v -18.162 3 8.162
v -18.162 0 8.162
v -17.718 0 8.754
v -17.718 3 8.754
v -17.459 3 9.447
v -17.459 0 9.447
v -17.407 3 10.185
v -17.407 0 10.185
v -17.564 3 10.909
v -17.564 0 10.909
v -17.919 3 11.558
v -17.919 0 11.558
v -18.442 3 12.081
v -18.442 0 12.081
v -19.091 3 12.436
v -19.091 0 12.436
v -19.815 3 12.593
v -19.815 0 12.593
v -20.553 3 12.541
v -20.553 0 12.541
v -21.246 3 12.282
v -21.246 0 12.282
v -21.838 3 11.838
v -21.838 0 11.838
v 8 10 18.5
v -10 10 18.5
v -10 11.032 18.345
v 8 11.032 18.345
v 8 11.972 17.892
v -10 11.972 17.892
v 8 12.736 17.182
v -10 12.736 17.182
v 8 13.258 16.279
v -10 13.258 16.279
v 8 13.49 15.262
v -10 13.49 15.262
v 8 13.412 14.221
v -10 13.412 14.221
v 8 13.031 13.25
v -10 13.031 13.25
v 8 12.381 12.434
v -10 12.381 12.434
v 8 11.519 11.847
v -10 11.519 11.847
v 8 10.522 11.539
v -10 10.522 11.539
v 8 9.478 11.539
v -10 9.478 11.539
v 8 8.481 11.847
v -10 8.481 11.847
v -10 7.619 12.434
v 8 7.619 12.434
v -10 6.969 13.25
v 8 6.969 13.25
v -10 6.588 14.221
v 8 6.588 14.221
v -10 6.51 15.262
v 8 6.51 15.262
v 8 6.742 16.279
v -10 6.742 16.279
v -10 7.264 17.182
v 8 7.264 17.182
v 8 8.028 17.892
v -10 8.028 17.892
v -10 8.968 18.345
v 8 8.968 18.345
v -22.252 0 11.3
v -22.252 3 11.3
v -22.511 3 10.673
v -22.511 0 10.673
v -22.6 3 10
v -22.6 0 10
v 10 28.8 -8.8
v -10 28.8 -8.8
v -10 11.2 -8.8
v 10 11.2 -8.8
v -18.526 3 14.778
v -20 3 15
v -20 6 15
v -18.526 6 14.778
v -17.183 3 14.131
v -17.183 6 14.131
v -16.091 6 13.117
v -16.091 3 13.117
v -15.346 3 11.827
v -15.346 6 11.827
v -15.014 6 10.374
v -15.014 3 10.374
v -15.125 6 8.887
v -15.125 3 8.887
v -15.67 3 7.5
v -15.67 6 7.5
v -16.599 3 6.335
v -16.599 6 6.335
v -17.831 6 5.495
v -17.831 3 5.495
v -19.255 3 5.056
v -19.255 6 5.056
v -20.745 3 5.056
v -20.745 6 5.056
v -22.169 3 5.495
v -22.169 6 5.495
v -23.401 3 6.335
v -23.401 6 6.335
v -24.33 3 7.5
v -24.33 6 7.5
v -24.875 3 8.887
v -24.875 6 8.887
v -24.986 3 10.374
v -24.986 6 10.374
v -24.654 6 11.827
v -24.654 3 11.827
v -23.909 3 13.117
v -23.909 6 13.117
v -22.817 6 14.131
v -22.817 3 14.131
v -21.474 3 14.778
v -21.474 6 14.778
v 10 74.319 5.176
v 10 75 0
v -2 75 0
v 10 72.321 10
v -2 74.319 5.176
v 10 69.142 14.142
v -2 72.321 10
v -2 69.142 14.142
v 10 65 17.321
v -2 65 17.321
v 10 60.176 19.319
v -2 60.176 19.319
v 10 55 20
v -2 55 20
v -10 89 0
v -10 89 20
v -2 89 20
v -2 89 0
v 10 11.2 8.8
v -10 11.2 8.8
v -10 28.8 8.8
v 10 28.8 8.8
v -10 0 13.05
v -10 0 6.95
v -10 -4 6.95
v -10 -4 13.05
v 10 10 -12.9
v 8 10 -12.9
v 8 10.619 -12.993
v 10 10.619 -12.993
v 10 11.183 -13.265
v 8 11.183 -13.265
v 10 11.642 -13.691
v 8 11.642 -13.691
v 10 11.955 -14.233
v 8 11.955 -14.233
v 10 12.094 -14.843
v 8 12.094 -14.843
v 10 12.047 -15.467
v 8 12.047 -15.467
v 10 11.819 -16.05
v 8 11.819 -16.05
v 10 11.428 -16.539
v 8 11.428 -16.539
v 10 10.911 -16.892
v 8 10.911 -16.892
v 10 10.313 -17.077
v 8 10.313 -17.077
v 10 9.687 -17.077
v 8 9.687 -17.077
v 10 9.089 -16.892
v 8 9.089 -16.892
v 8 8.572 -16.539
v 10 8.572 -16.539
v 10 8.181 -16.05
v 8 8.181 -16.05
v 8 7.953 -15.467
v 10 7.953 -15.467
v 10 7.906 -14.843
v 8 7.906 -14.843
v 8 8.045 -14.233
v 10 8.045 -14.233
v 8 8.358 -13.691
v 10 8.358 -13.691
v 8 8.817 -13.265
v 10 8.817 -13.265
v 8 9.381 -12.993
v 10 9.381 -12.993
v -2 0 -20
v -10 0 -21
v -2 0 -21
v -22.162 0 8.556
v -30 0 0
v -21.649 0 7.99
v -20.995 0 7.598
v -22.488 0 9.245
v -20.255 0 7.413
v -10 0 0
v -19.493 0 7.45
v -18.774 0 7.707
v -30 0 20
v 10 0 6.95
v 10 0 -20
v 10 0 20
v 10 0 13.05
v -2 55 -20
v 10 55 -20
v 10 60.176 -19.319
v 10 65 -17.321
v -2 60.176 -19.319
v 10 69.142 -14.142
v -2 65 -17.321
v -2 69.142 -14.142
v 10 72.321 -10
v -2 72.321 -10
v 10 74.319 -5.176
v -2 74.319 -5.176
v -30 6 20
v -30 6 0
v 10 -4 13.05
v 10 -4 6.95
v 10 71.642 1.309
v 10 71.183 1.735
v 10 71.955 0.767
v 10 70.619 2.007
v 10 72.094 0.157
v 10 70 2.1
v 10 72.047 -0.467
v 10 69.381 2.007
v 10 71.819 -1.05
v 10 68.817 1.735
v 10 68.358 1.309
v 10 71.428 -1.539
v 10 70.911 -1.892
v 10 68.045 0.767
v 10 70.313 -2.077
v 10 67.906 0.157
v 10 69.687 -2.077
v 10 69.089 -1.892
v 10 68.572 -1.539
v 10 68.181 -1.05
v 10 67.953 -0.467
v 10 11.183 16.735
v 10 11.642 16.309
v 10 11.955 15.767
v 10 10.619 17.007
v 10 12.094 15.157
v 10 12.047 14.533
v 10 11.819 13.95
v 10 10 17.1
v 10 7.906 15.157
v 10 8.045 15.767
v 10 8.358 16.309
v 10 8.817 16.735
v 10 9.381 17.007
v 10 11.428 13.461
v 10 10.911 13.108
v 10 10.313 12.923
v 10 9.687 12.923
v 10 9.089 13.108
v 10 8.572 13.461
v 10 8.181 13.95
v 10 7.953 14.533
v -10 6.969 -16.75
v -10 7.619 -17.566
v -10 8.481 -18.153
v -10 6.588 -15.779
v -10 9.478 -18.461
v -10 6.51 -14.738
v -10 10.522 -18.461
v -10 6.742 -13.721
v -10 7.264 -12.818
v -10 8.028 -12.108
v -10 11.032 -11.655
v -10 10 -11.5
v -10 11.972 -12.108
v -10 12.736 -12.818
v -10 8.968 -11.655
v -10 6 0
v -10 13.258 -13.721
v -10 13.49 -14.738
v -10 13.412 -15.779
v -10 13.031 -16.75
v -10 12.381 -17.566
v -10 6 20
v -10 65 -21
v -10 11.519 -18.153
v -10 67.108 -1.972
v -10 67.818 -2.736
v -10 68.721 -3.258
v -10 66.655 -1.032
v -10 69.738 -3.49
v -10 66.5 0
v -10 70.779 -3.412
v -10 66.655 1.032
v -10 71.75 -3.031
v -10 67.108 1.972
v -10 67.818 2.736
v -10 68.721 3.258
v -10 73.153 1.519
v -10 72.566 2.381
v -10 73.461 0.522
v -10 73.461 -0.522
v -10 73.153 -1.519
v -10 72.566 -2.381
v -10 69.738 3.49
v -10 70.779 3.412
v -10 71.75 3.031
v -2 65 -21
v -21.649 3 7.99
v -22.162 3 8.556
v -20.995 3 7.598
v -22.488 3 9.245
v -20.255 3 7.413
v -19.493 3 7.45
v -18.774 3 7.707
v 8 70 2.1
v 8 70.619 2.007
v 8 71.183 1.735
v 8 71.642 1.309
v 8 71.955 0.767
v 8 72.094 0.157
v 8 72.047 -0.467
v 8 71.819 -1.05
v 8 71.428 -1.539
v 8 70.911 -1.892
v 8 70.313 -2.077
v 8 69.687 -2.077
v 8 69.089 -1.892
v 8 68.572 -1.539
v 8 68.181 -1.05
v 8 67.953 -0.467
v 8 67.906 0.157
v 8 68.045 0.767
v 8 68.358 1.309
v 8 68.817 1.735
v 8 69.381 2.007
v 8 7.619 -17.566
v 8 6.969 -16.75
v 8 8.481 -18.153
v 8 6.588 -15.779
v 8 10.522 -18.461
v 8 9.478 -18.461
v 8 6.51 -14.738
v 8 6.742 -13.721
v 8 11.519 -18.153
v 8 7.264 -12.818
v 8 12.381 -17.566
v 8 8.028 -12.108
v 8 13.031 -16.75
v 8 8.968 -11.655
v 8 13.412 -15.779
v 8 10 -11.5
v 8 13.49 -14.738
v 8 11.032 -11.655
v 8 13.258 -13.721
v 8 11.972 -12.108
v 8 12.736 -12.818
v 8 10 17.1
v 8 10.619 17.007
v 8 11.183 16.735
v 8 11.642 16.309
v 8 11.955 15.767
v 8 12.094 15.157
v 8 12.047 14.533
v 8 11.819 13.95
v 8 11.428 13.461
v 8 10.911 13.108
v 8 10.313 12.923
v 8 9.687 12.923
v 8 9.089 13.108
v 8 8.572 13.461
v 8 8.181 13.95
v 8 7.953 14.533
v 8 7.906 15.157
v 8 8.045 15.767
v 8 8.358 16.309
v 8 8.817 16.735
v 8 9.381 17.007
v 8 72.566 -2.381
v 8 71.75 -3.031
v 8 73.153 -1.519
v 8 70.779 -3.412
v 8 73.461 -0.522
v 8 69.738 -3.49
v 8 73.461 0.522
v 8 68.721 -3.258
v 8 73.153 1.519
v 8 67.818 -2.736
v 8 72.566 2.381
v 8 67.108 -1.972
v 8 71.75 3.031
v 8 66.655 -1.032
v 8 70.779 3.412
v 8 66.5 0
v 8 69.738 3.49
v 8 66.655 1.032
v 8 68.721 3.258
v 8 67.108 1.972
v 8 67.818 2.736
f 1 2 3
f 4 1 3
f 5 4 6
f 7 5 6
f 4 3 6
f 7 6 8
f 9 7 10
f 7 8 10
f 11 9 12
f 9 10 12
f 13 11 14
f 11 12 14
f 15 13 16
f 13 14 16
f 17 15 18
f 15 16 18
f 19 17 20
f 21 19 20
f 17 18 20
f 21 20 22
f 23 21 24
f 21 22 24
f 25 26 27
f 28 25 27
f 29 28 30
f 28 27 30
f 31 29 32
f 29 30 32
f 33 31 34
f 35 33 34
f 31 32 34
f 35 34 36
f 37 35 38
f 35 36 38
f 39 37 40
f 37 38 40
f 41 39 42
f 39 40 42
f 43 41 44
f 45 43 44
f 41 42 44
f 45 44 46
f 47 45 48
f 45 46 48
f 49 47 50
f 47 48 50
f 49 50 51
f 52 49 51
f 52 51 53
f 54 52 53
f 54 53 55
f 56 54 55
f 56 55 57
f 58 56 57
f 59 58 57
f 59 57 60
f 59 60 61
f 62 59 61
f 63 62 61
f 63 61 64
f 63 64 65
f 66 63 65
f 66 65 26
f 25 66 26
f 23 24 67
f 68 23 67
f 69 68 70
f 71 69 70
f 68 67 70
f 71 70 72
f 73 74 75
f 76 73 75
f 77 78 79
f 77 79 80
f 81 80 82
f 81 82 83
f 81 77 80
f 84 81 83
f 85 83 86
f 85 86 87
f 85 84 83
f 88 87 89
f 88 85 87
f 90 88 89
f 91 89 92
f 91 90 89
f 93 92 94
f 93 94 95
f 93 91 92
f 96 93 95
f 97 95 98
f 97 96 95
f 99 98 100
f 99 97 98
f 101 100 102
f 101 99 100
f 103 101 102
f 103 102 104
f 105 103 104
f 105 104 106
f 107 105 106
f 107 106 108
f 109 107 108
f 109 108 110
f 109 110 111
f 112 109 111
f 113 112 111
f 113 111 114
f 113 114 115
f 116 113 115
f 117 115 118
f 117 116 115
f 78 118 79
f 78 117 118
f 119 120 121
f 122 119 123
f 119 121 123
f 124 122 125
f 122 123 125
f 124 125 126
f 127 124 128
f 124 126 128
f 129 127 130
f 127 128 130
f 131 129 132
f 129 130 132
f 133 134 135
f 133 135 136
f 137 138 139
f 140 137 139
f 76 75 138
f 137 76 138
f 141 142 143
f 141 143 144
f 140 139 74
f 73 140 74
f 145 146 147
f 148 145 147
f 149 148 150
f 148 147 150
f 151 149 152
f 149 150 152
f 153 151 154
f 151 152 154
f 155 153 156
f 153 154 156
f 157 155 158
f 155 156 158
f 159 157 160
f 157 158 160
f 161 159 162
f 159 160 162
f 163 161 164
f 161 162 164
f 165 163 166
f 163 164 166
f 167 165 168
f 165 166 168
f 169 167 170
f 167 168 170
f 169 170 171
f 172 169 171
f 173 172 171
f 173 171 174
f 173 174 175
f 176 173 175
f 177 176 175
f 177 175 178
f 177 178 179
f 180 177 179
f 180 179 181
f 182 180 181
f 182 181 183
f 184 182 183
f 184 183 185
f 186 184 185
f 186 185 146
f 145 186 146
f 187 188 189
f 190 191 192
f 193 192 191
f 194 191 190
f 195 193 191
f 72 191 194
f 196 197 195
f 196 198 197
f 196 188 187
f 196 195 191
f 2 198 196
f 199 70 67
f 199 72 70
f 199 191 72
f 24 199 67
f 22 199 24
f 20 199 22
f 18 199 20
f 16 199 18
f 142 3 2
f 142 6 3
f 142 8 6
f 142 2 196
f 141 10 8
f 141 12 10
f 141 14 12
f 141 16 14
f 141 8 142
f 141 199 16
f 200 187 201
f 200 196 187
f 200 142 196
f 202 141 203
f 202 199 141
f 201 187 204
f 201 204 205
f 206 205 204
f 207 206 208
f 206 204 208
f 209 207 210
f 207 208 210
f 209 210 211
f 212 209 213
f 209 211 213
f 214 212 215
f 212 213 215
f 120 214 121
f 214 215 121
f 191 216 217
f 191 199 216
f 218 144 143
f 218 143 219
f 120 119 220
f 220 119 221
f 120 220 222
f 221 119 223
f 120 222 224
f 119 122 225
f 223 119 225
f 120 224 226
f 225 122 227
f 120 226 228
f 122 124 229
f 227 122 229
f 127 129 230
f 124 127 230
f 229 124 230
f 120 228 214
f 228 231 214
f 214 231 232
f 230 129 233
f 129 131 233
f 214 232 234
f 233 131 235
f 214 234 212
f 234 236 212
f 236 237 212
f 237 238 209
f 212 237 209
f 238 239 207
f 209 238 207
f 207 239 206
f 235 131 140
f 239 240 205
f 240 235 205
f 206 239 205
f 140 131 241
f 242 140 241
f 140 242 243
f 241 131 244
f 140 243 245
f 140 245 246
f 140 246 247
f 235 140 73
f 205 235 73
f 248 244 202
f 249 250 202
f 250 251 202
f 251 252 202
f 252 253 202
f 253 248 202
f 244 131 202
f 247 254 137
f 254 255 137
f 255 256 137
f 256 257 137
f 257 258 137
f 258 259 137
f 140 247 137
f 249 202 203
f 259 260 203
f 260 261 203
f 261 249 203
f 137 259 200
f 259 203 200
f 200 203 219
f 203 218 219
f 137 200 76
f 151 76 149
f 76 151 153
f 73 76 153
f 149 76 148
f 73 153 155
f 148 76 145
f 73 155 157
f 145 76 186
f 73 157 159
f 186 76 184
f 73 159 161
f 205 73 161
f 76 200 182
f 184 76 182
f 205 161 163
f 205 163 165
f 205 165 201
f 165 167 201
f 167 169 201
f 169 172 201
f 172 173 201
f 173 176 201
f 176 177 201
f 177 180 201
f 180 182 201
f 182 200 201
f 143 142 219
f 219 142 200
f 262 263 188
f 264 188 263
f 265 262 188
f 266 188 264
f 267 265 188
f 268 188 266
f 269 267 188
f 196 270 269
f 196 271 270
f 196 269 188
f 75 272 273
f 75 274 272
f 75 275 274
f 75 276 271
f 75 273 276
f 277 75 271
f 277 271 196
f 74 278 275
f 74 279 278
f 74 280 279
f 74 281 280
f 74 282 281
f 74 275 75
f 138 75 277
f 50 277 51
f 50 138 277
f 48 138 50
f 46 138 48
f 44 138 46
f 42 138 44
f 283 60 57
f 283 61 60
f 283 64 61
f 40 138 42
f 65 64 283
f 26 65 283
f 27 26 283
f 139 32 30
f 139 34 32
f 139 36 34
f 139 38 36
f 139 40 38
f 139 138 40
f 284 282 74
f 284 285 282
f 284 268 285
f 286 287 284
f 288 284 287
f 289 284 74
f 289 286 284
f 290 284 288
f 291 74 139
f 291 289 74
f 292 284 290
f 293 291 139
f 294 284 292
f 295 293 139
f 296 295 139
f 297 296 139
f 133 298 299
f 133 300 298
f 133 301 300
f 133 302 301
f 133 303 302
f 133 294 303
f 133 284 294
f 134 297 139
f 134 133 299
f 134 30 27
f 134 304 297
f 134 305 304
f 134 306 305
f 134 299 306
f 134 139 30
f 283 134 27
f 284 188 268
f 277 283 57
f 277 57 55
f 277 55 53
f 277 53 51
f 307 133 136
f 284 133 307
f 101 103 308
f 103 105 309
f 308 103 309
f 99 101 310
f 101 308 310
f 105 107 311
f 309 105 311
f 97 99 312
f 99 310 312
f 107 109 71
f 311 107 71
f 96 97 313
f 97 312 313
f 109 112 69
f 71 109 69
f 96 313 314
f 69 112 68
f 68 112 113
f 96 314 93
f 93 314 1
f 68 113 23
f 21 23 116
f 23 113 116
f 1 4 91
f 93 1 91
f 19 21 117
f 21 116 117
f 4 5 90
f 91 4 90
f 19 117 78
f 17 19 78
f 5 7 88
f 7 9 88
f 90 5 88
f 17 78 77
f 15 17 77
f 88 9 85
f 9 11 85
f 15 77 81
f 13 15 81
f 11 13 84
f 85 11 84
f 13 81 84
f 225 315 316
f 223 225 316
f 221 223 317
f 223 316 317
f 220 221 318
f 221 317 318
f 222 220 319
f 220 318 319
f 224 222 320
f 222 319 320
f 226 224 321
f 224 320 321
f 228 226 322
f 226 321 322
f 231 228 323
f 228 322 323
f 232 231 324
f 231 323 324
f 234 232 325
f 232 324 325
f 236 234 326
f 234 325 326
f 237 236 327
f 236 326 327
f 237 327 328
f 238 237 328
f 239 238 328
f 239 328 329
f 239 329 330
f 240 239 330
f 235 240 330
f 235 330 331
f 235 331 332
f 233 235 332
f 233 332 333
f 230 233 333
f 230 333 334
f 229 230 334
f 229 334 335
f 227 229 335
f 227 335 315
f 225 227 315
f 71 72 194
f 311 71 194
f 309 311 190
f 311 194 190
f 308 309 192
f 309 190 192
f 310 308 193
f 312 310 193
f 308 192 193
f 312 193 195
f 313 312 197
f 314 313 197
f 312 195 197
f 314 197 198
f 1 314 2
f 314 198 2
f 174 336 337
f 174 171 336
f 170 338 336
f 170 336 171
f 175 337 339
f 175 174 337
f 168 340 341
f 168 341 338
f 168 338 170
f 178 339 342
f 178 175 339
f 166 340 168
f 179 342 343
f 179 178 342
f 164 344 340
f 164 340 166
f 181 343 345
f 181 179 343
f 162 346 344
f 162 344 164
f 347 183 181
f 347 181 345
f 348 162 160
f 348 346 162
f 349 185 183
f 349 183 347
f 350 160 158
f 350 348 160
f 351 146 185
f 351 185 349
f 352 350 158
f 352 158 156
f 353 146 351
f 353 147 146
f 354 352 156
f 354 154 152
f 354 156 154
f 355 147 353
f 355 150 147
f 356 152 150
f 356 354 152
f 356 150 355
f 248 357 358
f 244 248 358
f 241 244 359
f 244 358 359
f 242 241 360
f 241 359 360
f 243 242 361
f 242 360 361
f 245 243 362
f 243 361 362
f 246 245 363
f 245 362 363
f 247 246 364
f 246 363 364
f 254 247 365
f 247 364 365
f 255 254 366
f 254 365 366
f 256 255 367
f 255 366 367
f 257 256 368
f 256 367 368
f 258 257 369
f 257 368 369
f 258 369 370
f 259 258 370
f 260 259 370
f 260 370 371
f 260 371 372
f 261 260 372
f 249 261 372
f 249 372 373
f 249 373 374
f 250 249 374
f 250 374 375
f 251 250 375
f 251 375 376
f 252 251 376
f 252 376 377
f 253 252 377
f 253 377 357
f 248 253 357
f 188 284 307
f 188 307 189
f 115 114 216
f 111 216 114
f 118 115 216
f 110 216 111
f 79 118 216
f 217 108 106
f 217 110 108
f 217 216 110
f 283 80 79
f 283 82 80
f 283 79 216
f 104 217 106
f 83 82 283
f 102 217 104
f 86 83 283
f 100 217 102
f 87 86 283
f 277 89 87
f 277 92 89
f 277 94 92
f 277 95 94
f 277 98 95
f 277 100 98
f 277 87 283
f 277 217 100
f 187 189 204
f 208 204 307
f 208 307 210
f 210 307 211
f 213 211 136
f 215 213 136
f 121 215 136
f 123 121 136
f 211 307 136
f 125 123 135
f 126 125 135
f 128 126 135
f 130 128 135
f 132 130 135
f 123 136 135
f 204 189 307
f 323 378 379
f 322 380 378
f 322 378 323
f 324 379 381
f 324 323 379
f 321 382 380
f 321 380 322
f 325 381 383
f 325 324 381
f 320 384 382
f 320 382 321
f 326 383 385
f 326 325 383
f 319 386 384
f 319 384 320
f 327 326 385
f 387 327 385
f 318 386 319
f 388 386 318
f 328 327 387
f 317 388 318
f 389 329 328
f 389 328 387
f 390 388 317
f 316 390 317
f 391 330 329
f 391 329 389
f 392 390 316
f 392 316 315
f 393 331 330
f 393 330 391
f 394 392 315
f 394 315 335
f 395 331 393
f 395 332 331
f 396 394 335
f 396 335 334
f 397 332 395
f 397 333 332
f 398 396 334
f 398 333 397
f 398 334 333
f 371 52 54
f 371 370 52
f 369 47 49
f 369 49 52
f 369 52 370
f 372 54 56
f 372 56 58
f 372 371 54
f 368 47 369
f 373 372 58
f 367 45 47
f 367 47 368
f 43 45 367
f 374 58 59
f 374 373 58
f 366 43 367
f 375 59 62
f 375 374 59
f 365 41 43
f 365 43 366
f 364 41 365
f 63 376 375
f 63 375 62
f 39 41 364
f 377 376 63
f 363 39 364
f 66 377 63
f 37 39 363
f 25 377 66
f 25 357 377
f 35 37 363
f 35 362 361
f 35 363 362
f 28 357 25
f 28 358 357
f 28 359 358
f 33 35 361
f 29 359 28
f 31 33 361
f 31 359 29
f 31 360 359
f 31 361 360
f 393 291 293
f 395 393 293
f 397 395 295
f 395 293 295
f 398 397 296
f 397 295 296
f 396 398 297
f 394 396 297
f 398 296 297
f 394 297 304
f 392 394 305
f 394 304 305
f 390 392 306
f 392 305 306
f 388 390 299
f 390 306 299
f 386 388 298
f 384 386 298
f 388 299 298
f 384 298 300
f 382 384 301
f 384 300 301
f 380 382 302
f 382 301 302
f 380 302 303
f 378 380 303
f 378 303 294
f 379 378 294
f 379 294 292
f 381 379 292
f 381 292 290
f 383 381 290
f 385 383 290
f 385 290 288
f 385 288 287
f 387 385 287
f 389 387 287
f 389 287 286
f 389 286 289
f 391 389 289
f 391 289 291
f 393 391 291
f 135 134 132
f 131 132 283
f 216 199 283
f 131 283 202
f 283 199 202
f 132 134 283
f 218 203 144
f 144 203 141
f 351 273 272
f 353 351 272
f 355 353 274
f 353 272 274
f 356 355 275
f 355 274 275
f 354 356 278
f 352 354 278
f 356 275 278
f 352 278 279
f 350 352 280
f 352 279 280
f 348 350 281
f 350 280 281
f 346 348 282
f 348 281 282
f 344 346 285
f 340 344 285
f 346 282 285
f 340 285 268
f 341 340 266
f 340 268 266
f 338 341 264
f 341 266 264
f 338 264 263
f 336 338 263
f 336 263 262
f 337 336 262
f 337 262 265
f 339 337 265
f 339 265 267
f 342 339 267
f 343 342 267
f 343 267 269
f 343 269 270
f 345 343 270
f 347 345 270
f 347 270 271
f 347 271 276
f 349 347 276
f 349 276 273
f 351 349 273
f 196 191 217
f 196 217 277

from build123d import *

# Parameters (mm, degrees)
SKETCH_1_W           = 20
SKETCH_1_H           = 60
SKETCH_1_R           = 2.6
EXTRUDE_1_DEPTH      = 6
SKETCH_2_W           = 6.1
SKETCH_2_H           = 43.9
SKETCH_2_H_2         = 1.95
SKETCH_2_W_2         = 6.043917029
EXTRUDE_2_DEPTH      = 4
SKETCH_3_R           = 4.9
CUT_EXTRUDE_3_DEPTH  = 3
SKETCH_4_W           = 20
SKETCH_4_H           = 40
EXTRUDE_3_DEPTH      = 69
CUT_EXTRUDE_4_DEPTH  = 75
SKETCH_6_R           = 2.1
CUT_EXTRUDE_5_DEPTH  = 75
CUT_EXTRUDE_6_DEPTH  = 75
SKETCH_13_R          = 3.5
CUT_EXTRUDE_8_DEPTH  = 3
SKETCH_14_R          = 3.5
CUT_EXTRUDE_9_DEPTH  = 3
SKETCH_15_W          = 6.1
SKETCH_15_H          = 1.95
SKETCH_15_W_2        = 6.043917029
CUT_EXTRUDE_10_DEPTH = 4
SKETCH_24_R          = 3.5
CUT_EXTRUDE_14_DEPTH = 15
SKETCH_25_R          = 3.5
CUT_EXTRUDE_15_DEPTH = 15
SKETCH_26_W          = 6.1
SKETCH_26_H          = 43.9
CUT_EXTRUDE_16_DEPTH = 4
SKETCH_27_W          = 20
SKETCH_27_H          = 10
CUT_EXTRUDE_17_DEPTH = 10
EXTRUDE_4_DEPTH      = 4
SKETCH_29_R          = 3.5
CUT_EXTRUDE_18_DEPTH = 18
EXTRUDE_5_DEPTH      = 8
SKETCH_31_W          = 20
SKETCH_31_H          = 20
EXTRUDE_6_DEPTH      = 3
CUT_EXTRUDE_19_DEPTH = 6
SKETCH_33_W          = 20
SKETCH_33_H          = 20
SKETCH_33_R          = 5
EXTRUDE_7_DEPTH      = 3


with BuildPart() as part:
    # 草图1 → 凸台-拉伸1 (new body)
    with BuildSketch(Plane(origin=(0, 0, 0), x_dir=(1, 0, 0), z_dir=(0, 1, 0))):
        Rectangle(SKETCH_1_W, SKETCH_1_H)
        with Locations(Location((0, 25, 0), (0, 0, 270))):
            Circle(SKETCH_1_R, mode=Mode.SUBTRACT)
        with Locations(Location((0, -25, 0), (0, 0, 270))):
            Circle(SKETCH_1_R, mode=Mode.SUBTRACT)
    extrude(amount=EXTRUDE_1_DEPTH)

    # 草图2 → 凸台-拉伸2 (add)
    with BuildSketch(Plane.XZ):
        Rectangle(SKETCH_2_W, SKETCH_2_H)
        with Locations((0, 29.025)):
            Rectangle(SKETCH_2_W, SKETCH_2_H_2)
        with Locations((0.028041485, -29.025)):
            Rectangle(SKETCH_2_W_2, SKETCH_2_H_2)
    extrude(amount=EXTRUDE_2_DEPTH)

    # 草图3 → 切除-拉伸3 (cut)
    with BuildSketch(Plane(origin=(0, 6, 0), x_dir=(1, 0, 0), z_dir=(0, 1, 0))):
        with Locations(Location((0, -25, 0), (0, 0, 270))):
            Circle(SKETCH_3_R)
        with Locations(Location((0, 25, 0), (0, 0, 270))):
            Circle(SKETCH_3_R)
    extrude(amount=-CUT_EXTRUDE_3_DEPTH, mode=Mode.SUBTRACT)

    # 草图4 → 凸台-拉伸3 (add)
    with BuildSketch(Plane(origin=(0, 6, 0), x_dir=(1, 0, 0), z_dir=(0, 1, 0))):
        Rectangle(SKETCH_4_W, SKETCH_4_H)
    extrude(amount=EXTRUDE_3_DEPTH)

    # 草图5 → 切除-拉伸4 (cut)
    with BuildSketch(Plane.ZY.offset(10)):
        Polygon((-8.8, 11.2), (0, 11.2), (8.8, 11.2), (8.8, 28.8), (0, 28.8), (-8.8, 28.8), align=None)
    extrude(amount=-CUT_EXTRUDE_4_DEPTH, mode=Mode.SUBTRACT)

    # 草图6 → 切除-拉伸5 (cut)
    with BuildSketch(Plane.ZY.offset(10)):
        with Locations((0, 70)):
            Circle(SKETCH_6_R)
        with Locations((-15, 10)):
            Circle(SKETCH_6_R)
        with Locations((15, 10)):
            Circle(SKETCH_6_R)
    extrude(amount=-CUT_EXTRUDE_5_DEPTH, mode=Mode.SUBTRACT)

    # 草图7 → 切除-拉伸6 (cut)
    with BuildSketch(Plane.ZY.offset(10)):
        with BuildLine():
            Line((-20, 75), (-20, 55))
            ThreePointArc((-20, 55), (-14.142135624, 69.142135624), (0, 75))
            Line((0, 75), (-20, 75))
        make_face()
        with BuildLine():
            Line((20, 75), (0, 75))
            ThreePointArc((0, 75), (14.142135624, 69.142135624), (20, 55))
            Line((20, 55), (20, 75))
        make_face()
    extrude(amount=-CUT_EXTRUDE_6_DEPTH, mode=Mode.SUBTRACT)

    # 草图13 → 切除-拉伸8 (cut)
    with BuildSketch(Plane.ZY.offset(10)):
        with Locations((-15, 10)):
            Circle(SKETCH_13_R)
        with Locations((15, 10)):
            Circle(SKETCH_13_R)
    extrude(amount=-CUT_EXTRUDE_8_DEPTH, mode=Mode.SUBTRACT)

    # 草图14 → 切除-拉伸9 (cut)
    with BuildSketch(Plane.ZY.offset(-5)):
        with Locations(Location((0, 70, 0), (0, 0, 270))):
            Circle(SKETCH_14_R)
    extrude(amount=-CUT_EXTRUDE_9_DEPTH, mode=Mode.SUBTRACT)

    # 草图15 → 切除-拉伸10 (cut)
    with BuildSketch(Plane(origin=(0, -4, 0), x_dir=(-1, 0, 0), z_dir=(0, -1, 0))):
        with Locations((0, -29.025)):
            Rectangle(SKETCH_15_W, SKETCH_15_H)
        with Locations((-0.028041485, 29.025)):
            Rectangle(SKETCH_15_W_2, SKETCH_15_H)
    extrude(amount=-CUT_EXTRUDE_10_DEPTH, mode=Mode.SUBTRACT)

    # 草图24 → 切除-拉伸14 (cut)
    with BuildSketch(Plane.ZY.offset(10)):
        with Locations((-15, 10)):
            Circle(SKETCH_24_R)
        with Locations((15, 10)):
            Circle(SKETCH_24_R)
    extrude(amount=-CUT_EXTRUDE_14_DEPTH, mode=Mode.SUBTRACT)

    # 草图25 → 切除-拉伸15 (cut)
    with BuildSketch(Plane.ZY.offset(10)):
        with Locations(Location((0, 70, 0), (0, 0, 270))):
            Circle(SKETCH_25_R)
    extrude(amount=-CUT_EXTRUDE_15_DEPTH, mode=Mode.SUBTRACT)

    # 草图26 → 切除-拉伸16 (cut)
    with BuildSketch(Plane(origin=(0, -4, 0), x_dir=(-1, 0, 0), z_dir=(0, -1, 0))):
        Rectangle(SKETCH_26_W, SKETCH_26_H)
    extrude(amount=-CUT_EXTRUDE_16_DEPTH, mode=Mode.SUBTRACT)

    # 草图27 → 切除-拉伸17 (cut)
    with BuildSketch(Plane(origin=(0, 6, 0), x_dir=(1, 0, 0), z_dir=(0, 1, 0))):
        with Locations((0, 25)):
            Rectangle(SKETCH_27_W, SKETCH_27_H)
        with Locations((0, -25)):
            Rectangle(SKETCH_27_W, SKETCH_27_H)
    extrude(amount=-CUT_EXTRUDE_17_DEPTH, mode=Mode.SUBTRACT)

    # 草图28 → 凸台-拉伸4 (add)
    with BuildSketch(Plane.XZ):
        Polygon((10, 6.95), (10, 10), (10, 13.05), (-10, 13.05), (-10, 10), (-10, 6.95), align=None)
    extrude(amount=EXTRUDE_4_DEPTH)

    # 草图29 → 切除-拉伸18 (cut)
    with BuildSketch(Plane.ZY.offset(10)):
        with Locations(Location((0, 70, 0), (0, 0, 270))):
            Circle(SKETCH_29_R)
        with Locations((15, 10)):
            Circle(SKETCH_29_R)
        with Locations((-15, 10)):
            Circle(SKETCH_29_R)
    extrude(amount=-CUT_EXTRUDE_18_DEPTH, mode=Mode.SUBTRACT)

    # 草图30 → 凸台-拉伸5 (add)
    with BuildSketch(Plane.ZY.offset(10)):
        with BuildLine():
            Line((20, 55), (20, 89))
            Line((20, 89), (0, 89))
            Line((0, 89), (-21, 65))
            Line((-21, 65), (-21, 0))
            Line((-21, 0), (-20, 0))
            Line((-20, 0), (-20, 55))
            ThreePointArc((-20, 55), (0, 75), (20, 55))
        make_face()
    extrude(amount=-EXTRUDE_5_DEPTH)

    # 草图31 → 凸台-拉伸6 (add)
    with BuildSketch(Plane.XZ):
        with Locations((-20, 10)):
            Rectangle(SKETCH_31_W, SKETCH_31_H)
    extrude(amount=-EXTRUDE_6_DEPTH)

    # 草图32 → 切除-拉伸19 (cut)
    with BuildSketch(Plane(origin=(0, 0, 0), x_dir=(-1, 0, 0), z_dir=(0, -1, 0))):
        with BuildLine():
            ThreePointArc((18.161522369, -8.161522369), (18.161522369, -11.838477631), (21.838477631, -11.838477631))
            Line((21.838477631, -11.838477631), (18.161522369, -8.161522369))
        make_face()
        with BuildLine():
            Line((18.161522369, -8.161522369), (21.838477631, -11.838477631))
            ThreePointArc((21.838477631, -11.838477631), (22.402086785, -10.994976924), (22.6, -10))
            ThreePointArc((22.6, -10), (20.994976924, -7.597913215), (18.161522369, -8.161522369))
        make_face()
    extrude(amount=-CUT_EXTRUDE_19_DEPTH, mode=Mode.SUBTRACT)

    # 草图33 → 凸台-拉伸7 (add)
    with BuildSketch(Plane(origin=(0, 3, 0), x_dir=(1, 0, 0), z_dir=(0, 1, 0))):
        with Locations((-20, -10)):
            Rectangle(SKETCH_33_W, SKETCH_33_H)
        with Locations(Location((-20, -10, 0), (0, 0, 270))):
            Circle(SKETCH_33_R, mode=Mode.SUBTRACT)
    extrude(amount=EXTRUDE_7_DEPTH)


solid = part.part
